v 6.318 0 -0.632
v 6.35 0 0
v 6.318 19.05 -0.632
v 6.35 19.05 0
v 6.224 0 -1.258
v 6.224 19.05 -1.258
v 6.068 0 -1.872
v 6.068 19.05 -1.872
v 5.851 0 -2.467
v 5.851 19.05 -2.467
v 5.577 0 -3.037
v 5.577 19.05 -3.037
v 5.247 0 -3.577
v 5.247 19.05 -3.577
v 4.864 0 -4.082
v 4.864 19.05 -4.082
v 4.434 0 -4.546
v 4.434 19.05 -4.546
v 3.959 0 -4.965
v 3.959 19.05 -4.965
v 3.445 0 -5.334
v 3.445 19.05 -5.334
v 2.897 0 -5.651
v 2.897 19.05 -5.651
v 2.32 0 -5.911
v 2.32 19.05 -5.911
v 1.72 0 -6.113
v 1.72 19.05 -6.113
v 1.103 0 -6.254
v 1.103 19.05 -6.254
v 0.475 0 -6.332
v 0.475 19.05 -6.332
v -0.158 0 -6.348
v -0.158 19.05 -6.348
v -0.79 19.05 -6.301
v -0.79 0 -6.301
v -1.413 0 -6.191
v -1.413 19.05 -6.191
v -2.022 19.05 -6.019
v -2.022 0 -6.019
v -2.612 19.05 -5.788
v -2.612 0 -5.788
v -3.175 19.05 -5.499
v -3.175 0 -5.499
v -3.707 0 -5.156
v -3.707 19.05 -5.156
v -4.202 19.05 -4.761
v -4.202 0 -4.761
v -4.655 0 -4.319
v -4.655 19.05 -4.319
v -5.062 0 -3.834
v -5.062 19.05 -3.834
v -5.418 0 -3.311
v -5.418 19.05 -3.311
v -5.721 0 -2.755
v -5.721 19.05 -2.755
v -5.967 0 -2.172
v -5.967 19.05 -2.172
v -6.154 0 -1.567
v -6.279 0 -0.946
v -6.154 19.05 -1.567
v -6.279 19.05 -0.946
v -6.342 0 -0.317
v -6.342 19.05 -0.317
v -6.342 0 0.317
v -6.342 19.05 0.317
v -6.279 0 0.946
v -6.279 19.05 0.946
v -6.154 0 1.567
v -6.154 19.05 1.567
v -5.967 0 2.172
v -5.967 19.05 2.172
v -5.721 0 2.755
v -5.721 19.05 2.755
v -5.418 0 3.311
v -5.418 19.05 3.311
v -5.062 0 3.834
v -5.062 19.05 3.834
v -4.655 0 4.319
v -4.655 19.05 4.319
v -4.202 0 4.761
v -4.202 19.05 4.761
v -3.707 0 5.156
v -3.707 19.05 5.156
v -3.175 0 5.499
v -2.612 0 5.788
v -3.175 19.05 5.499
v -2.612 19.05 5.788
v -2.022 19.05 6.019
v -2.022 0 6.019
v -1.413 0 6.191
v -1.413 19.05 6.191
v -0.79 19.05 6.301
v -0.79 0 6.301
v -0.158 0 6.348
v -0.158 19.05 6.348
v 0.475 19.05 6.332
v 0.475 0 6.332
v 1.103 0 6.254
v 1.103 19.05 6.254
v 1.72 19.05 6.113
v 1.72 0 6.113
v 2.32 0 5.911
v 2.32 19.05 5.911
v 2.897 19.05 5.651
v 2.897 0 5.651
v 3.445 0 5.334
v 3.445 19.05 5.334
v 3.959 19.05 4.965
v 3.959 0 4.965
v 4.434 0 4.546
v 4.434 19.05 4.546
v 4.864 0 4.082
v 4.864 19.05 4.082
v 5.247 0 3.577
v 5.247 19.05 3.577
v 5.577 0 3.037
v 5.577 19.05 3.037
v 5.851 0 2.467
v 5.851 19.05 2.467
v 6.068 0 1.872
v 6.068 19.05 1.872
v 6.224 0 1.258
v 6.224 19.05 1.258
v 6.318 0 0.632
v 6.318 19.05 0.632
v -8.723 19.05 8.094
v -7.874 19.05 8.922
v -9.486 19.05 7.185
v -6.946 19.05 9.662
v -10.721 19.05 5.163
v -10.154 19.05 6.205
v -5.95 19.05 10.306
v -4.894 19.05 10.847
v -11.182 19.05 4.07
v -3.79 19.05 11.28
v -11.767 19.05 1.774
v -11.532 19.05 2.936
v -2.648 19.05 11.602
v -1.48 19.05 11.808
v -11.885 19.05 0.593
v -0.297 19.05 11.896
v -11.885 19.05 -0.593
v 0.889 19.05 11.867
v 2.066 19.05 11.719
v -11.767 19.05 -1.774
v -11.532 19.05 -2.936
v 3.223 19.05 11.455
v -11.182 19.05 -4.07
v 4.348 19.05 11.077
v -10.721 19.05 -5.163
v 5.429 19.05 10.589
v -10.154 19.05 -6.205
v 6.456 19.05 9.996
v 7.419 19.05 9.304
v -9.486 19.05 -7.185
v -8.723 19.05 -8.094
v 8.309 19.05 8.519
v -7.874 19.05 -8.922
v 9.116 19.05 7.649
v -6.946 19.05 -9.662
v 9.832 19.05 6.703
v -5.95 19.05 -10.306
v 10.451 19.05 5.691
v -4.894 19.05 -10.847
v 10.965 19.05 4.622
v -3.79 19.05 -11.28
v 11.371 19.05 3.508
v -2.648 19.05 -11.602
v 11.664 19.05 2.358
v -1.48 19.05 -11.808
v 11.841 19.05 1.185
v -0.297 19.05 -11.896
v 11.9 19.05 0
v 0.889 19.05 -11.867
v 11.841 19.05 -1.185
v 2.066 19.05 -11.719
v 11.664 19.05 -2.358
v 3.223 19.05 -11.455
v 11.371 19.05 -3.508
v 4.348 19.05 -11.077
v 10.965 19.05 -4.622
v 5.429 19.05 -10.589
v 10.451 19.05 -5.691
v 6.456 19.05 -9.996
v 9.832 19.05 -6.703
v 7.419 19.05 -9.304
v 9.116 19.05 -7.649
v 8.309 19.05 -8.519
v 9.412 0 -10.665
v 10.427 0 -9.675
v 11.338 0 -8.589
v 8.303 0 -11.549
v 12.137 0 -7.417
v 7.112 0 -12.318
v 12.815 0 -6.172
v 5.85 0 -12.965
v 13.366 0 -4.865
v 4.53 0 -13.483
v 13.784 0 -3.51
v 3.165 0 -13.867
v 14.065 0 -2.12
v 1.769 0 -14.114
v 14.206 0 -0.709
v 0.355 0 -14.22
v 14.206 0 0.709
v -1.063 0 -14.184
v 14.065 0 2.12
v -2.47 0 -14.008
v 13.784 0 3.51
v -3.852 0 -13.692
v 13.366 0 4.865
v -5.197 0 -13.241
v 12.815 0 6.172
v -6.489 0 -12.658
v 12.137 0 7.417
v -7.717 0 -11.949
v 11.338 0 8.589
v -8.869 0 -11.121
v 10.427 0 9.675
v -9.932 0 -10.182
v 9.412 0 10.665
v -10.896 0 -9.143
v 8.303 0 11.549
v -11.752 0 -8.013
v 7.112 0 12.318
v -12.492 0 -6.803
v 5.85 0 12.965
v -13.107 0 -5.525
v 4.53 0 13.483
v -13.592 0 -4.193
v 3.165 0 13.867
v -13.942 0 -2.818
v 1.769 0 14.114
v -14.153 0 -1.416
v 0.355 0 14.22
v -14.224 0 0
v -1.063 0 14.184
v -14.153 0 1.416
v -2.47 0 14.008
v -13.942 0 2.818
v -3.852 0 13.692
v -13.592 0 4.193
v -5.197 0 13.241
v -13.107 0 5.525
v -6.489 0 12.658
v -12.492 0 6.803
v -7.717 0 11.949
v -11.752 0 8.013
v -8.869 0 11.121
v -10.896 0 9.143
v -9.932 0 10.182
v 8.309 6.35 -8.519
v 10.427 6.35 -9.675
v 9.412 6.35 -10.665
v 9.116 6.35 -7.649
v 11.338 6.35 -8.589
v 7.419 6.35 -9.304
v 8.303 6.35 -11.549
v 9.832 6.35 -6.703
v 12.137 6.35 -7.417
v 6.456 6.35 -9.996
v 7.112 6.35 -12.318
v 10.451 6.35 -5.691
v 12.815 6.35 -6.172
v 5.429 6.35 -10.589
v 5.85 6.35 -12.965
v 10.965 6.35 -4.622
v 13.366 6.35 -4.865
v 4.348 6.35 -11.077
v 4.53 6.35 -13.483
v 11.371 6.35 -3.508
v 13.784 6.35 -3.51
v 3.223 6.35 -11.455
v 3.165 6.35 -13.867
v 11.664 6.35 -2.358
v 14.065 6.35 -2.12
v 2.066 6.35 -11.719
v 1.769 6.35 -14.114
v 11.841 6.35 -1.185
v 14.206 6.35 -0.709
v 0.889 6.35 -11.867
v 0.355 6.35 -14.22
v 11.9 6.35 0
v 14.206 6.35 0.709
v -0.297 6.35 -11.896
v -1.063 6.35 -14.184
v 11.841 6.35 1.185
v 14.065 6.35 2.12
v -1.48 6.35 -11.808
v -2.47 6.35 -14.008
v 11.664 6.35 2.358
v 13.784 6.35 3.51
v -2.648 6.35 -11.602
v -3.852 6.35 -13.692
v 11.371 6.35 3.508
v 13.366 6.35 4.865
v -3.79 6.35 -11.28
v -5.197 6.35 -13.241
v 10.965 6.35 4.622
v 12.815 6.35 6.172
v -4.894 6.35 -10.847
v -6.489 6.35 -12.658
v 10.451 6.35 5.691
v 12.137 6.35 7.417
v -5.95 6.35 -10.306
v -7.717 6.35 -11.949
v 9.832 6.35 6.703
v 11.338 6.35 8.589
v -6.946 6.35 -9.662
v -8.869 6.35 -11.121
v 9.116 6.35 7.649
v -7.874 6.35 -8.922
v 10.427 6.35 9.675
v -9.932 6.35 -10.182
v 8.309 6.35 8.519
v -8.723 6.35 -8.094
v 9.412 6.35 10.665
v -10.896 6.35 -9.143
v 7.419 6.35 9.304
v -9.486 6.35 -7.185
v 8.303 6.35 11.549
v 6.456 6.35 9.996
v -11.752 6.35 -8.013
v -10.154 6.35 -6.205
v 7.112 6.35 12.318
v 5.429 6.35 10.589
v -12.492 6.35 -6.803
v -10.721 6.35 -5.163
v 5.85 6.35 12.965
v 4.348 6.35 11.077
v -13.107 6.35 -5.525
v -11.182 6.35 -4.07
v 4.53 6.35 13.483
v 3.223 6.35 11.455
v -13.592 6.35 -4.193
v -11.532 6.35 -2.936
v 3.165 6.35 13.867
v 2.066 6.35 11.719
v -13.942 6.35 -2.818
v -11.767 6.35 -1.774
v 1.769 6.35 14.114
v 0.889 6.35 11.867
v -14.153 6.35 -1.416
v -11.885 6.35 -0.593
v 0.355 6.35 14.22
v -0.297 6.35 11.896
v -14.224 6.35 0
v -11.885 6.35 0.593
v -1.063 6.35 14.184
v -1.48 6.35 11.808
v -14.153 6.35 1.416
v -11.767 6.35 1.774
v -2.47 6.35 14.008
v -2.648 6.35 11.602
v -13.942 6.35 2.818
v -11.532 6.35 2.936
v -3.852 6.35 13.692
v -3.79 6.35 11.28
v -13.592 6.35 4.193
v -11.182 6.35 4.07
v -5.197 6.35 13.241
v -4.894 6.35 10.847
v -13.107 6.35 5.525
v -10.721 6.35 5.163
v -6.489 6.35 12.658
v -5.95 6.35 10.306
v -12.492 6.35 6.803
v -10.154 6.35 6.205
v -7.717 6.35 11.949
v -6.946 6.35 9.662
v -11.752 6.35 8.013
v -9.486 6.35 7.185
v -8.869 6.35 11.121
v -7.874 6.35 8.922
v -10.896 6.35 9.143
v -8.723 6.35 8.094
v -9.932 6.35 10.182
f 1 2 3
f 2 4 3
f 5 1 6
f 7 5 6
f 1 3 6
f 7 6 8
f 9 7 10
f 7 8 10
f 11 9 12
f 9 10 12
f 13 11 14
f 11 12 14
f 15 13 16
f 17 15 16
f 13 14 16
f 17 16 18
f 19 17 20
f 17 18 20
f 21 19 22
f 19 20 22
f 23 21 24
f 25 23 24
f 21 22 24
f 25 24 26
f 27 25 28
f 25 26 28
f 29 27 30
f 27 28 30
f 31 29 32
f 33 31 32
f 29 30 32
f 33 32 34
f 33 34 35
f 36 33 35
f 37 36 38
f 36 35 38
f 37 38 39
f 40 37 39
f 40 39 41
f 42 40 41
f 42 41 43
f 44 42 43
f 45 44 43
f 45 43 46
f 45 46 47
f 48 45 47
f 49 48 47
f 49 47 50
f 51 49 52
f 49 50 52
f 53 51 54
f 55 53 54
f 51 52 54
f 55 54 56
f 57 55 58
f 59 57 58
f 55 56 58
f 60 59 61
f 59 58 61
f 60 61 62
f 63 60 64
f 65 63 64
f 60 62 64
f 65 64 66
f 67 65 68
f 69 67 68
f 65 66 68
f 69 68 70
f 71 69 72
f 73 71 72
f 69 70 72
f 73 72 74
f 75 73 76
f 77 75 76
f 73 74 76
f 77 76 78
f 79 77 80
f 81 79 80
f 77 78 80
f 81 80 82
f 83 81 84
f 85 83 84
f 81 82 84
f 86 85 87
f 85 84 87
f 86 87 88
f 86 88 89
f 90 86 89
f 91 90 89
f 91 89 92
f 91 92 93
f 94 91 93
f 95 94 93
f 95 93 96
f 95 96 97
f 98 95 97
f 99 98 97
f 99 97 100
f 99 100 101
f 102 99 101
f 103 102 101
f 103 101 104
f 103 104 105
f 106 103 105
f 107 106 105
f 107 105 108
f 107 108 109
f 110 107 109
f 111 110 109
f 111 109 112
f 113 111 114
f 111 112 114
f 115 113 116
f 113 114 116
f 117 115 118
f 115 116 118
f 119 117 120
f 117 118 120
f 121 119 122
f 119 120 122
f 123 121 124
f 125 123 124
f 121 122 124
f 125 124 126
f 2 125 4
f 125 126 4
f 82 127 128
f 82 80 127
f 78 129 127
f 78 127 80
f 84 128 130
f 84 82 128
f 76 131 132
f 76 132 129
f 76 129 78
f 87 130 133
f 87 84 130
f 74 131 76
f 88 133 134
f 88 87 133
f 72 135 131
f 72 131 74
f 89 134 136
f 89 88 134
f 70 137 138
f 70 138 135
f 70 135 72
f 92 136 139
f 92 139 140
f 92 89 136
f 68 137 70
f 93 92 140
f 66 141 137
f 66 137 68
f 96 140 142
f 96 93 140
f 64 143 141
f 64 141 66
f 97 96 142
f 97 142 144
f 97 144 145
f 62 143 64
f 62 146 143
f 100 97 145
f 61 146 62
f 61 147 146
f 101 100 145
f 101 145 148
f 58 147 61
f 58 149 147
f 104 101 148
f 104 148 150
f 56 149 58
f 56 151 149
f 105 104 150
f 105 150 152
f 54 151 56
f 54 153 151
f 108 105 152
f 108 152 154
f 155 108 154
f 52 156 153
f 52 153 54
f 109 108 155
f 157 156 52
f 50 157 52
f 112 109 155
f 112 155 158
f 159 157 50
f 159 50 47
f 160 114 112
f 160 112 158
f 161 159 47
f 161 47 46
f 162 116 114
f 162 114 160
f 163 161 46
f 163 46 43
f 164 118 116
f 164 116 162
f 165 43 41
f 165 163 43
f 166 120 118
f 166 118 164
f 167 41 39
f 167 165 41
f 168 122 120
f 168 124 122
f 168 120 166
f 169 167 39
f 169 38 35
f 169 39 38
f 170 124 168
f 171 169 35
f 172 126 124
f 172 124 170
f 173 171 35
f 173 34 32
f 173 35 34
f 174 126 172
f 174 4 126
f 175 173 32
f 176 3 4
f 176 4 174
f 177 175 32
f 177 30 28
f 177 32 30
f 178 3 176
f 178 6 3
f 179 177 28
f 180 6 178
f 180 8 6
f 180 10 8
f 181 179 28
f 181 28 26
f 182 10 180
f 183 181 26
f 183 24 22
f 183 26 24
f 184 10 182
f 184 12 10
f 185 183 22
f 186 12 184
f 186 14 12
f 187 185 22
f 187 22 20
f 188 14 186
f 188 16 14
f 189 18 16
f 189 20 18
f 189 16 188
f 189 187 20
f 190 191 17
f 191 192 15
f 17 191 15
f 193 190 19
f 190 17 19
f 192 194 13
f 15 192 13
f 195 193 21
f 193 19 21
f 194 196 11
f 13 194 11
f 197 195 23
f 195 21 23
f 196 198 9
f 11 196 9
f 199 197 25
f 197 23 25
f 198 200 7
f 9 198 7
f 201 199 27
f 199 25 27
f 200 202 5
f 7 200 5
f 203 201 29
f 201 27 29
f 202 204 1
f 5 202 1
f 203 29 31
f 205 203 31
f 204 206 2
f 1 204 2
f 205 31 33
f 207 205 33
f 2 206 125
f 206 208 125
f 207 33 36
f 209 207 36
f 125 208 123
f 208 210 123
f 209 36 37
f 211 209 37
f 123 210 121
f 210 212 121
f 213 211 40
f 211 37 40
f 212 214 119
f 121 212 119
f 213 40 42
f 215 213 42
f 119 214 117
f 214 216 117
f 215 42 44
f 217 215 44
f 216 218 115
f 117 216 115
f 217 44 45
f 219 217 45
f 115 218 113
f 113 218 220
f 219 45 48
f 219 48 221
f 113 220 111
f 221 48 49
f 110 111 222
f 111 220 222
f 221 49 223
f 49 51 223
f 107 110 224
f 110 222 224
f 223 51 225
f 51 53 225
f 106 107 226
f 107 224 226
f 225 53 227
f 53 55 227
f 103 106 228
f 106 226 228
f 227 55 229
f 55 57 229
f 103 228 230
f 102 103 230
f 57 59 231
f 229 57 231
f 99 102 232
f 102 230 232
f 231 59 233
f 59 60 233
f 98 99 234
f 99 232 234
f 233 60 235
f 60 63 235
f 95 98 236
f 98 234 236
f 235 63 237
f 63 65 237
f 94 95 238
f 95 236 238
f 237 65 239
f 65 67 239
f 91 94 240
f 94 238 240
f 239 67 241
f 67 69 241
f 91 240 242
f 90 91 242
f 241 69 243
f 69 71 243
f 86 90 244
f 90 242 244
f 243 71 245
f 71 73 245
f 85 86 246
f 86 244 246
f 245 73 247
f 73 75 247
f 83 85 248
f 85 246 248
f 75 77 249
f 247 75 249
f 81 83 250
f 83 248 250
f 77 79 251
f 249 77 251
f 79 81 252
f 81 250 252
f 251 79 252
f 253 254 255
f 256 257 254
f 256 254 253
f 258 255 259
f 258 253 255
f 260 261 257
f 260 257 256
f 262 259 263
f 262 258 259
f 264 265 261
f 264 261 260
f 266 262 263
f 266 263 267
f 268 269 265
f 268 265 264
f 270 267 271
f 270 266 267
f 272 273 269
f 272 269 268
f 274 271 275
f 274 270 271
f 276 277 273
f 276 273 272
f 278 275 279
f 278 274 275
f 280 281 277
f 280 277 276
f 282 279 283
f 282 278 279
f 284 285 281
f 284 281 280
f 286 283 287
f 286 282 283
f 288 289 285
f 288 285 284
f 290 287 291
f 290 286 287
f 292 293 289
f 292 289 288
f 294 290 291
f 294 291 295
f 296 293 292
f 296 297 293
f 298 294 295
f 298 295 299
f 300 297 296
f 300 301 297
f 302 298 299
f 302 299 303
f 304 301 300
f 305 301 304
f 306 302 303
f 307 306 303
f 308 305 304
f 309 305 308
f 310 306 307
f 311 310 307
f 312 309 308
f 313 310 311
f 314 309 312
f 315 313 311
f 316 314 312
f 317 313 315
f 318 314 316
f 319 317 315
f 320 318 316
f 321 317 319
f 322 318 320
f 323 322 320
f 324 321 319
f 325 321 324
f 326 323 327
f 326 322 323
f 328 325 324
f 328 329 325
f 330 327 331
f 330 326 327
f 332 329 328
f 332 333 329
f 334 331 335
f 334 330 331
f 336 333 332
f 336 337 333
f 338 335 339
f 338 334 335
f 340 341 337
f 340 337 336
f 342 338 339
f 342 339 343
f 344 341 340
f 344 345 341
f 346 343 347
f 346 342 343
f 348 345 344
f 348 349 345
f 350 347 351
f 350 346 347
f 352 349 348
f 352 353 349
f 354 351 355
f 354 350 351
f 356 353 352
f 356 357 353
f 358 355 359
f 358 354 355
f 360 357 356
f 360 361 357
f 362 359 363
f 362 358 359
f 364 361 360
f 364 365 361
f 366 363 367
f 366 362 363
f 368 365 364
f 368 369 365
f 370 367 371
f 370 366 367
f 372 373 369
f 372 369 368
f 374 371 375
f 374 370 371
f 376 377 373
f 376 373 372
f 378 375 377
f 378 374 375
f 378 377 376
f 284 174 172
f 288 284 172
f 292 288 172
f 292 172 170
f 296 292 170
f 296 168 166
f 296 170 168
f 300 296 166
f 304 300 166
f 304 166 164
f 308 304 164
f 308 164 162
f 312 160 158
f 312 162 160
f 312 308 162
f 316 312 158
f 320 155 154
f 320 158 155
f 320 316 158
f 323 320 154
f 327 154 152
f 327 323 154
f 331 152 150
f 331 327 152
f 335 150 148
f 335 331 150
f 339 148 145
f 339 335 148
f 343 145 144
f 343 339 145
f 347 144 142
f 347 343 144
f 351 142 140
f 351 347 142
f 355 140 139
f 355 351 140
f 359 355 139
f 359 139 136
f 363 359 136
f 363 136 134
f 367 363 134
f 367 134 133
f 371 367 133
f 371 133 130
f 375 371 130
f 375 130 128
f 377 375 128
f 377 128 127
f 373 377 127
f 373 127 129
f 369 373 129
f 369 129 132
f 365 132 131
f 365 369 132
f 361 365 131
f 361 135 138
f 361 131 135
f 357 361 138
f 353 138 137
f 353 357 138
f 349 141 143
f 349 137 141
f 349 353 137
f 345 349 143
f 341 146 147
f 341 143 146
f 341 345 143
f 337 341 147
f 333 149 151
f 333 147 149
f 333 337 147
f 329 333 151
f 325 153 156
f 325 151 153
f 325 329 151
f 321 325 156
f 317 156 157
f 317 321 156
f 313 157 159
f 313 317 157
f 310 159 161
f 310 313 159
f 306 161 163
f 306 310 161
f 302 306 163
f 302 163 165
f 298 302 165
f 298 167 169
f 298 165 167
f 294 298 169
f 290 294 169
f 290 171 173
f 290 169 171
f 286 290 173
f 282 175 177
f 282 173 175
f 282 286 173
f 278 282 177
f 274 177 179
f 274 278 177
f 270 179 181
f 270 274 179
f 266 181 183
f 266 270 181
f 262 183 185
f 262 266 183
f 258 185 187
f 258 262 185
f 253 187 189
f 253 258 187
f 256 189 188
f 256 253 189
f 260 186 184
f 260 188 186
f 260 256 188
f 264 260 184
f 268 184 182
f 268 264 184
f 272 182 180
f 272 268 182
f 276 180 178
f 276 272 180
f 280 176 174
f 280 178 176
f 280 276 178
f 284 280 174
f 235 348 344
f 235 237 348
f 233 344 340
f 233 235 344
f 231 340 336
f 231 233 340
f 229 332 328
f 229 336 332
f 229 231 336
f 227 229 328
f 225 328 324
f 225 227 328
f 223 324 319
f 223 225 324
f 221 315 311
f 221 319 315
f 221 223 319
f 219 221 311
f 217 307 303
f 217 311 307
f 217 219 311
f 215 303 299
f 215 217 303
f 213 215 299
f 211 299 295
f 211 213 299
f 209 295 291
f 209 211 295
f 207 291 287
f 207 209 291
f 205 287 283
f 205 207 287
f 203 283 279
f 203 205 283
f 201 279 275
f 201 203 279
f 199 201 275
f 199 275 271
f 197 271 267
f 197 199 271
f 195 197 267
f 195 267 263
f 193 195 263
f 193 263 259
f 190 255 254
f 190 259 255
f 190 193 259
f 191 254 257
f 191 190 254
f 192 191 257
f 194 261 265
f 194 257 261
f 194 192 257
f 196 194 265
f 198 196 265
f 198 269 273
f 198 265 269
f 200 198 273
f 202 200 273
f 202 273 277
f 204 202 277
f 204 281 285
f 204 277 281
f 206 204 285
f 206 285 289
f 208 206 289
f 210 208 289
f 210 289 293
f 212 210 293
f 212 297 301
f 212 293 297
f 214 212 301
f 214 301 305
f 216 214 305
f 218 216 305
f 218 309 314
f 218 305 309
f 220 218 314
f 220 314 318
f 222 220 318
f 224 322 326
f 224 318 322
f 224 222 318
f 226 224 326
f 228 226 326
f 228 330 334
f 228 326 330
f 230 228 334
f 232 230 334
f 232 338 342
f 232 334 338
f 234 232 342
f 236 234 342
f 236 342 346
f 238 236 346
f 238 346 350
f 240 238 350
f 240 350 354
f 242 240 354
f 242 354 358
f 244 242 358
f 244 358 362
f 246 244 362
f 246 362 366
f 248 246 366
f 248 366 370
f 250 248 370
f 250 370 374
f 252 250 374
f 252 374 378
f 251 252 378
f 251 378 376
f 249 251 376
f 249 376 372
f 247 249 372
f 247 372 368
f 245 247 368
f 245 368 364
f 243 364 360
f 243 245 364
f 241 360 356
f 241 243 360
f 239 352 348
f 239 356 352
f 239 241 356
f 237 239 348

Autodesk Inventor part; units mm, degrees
ref_plane "YZ Plane" through (0, 0, 0) normal (1, 0, 0) x (0, 1, 0)
ref_plane "XZ Plane" through (0, 0, 0) normal (0, 1, 0) x (-1, 0, 0)
ref_plane "XY Plane" through (0, 0, 0) normal (0, 0, 1) x (1, 0, 0)
sketch "Sketch1" plane through (0, 0, 0) normal (0, 1, 0) x (-1, 0, 0)
  circle A0 centre (0, 0) radius 14.224
  dimension "d0" = 28.448
extrude "Extrusion1" add sketch "Sketch1" along normal blind 6.35
sketch "Sketch2" plane through (0, 6.35, 0) normal (0, 1, 0) x (1, 0, 0)
  circle A0 centre (0, 0) radius 14.224 projected
  circle A1 centre (0, 0) radius 11.8999
  dimension "d3" = 23.7998
extrude "Extrusion2" add sketch "Sketch2" along normal blind 12.7 contours A1
sketch "Sketch3" plane through (0, 19.05, 0) normal (0, 1, 0) x (1, 0, 0)
  circle A0 centre (0, 0) radius 11.8999 projected
  circle A1 centre (0, 0) radius 6.35
  dimension "d6" = 12.7
extrude "Extrusion3" cut sketch "Sketch3" against normal blind 2540 contours A1
thread "Thread1" size "15/16-16 UN" class "2A" standard "ANSI Unified Screw Threads" full length
thread "Thread2" size "1-10 UNS" class "2B" standard "ANSI Unified Screw Threads" full length
properties part number "ACME Threaded Rod Nut" material "Bronze, Cast"
